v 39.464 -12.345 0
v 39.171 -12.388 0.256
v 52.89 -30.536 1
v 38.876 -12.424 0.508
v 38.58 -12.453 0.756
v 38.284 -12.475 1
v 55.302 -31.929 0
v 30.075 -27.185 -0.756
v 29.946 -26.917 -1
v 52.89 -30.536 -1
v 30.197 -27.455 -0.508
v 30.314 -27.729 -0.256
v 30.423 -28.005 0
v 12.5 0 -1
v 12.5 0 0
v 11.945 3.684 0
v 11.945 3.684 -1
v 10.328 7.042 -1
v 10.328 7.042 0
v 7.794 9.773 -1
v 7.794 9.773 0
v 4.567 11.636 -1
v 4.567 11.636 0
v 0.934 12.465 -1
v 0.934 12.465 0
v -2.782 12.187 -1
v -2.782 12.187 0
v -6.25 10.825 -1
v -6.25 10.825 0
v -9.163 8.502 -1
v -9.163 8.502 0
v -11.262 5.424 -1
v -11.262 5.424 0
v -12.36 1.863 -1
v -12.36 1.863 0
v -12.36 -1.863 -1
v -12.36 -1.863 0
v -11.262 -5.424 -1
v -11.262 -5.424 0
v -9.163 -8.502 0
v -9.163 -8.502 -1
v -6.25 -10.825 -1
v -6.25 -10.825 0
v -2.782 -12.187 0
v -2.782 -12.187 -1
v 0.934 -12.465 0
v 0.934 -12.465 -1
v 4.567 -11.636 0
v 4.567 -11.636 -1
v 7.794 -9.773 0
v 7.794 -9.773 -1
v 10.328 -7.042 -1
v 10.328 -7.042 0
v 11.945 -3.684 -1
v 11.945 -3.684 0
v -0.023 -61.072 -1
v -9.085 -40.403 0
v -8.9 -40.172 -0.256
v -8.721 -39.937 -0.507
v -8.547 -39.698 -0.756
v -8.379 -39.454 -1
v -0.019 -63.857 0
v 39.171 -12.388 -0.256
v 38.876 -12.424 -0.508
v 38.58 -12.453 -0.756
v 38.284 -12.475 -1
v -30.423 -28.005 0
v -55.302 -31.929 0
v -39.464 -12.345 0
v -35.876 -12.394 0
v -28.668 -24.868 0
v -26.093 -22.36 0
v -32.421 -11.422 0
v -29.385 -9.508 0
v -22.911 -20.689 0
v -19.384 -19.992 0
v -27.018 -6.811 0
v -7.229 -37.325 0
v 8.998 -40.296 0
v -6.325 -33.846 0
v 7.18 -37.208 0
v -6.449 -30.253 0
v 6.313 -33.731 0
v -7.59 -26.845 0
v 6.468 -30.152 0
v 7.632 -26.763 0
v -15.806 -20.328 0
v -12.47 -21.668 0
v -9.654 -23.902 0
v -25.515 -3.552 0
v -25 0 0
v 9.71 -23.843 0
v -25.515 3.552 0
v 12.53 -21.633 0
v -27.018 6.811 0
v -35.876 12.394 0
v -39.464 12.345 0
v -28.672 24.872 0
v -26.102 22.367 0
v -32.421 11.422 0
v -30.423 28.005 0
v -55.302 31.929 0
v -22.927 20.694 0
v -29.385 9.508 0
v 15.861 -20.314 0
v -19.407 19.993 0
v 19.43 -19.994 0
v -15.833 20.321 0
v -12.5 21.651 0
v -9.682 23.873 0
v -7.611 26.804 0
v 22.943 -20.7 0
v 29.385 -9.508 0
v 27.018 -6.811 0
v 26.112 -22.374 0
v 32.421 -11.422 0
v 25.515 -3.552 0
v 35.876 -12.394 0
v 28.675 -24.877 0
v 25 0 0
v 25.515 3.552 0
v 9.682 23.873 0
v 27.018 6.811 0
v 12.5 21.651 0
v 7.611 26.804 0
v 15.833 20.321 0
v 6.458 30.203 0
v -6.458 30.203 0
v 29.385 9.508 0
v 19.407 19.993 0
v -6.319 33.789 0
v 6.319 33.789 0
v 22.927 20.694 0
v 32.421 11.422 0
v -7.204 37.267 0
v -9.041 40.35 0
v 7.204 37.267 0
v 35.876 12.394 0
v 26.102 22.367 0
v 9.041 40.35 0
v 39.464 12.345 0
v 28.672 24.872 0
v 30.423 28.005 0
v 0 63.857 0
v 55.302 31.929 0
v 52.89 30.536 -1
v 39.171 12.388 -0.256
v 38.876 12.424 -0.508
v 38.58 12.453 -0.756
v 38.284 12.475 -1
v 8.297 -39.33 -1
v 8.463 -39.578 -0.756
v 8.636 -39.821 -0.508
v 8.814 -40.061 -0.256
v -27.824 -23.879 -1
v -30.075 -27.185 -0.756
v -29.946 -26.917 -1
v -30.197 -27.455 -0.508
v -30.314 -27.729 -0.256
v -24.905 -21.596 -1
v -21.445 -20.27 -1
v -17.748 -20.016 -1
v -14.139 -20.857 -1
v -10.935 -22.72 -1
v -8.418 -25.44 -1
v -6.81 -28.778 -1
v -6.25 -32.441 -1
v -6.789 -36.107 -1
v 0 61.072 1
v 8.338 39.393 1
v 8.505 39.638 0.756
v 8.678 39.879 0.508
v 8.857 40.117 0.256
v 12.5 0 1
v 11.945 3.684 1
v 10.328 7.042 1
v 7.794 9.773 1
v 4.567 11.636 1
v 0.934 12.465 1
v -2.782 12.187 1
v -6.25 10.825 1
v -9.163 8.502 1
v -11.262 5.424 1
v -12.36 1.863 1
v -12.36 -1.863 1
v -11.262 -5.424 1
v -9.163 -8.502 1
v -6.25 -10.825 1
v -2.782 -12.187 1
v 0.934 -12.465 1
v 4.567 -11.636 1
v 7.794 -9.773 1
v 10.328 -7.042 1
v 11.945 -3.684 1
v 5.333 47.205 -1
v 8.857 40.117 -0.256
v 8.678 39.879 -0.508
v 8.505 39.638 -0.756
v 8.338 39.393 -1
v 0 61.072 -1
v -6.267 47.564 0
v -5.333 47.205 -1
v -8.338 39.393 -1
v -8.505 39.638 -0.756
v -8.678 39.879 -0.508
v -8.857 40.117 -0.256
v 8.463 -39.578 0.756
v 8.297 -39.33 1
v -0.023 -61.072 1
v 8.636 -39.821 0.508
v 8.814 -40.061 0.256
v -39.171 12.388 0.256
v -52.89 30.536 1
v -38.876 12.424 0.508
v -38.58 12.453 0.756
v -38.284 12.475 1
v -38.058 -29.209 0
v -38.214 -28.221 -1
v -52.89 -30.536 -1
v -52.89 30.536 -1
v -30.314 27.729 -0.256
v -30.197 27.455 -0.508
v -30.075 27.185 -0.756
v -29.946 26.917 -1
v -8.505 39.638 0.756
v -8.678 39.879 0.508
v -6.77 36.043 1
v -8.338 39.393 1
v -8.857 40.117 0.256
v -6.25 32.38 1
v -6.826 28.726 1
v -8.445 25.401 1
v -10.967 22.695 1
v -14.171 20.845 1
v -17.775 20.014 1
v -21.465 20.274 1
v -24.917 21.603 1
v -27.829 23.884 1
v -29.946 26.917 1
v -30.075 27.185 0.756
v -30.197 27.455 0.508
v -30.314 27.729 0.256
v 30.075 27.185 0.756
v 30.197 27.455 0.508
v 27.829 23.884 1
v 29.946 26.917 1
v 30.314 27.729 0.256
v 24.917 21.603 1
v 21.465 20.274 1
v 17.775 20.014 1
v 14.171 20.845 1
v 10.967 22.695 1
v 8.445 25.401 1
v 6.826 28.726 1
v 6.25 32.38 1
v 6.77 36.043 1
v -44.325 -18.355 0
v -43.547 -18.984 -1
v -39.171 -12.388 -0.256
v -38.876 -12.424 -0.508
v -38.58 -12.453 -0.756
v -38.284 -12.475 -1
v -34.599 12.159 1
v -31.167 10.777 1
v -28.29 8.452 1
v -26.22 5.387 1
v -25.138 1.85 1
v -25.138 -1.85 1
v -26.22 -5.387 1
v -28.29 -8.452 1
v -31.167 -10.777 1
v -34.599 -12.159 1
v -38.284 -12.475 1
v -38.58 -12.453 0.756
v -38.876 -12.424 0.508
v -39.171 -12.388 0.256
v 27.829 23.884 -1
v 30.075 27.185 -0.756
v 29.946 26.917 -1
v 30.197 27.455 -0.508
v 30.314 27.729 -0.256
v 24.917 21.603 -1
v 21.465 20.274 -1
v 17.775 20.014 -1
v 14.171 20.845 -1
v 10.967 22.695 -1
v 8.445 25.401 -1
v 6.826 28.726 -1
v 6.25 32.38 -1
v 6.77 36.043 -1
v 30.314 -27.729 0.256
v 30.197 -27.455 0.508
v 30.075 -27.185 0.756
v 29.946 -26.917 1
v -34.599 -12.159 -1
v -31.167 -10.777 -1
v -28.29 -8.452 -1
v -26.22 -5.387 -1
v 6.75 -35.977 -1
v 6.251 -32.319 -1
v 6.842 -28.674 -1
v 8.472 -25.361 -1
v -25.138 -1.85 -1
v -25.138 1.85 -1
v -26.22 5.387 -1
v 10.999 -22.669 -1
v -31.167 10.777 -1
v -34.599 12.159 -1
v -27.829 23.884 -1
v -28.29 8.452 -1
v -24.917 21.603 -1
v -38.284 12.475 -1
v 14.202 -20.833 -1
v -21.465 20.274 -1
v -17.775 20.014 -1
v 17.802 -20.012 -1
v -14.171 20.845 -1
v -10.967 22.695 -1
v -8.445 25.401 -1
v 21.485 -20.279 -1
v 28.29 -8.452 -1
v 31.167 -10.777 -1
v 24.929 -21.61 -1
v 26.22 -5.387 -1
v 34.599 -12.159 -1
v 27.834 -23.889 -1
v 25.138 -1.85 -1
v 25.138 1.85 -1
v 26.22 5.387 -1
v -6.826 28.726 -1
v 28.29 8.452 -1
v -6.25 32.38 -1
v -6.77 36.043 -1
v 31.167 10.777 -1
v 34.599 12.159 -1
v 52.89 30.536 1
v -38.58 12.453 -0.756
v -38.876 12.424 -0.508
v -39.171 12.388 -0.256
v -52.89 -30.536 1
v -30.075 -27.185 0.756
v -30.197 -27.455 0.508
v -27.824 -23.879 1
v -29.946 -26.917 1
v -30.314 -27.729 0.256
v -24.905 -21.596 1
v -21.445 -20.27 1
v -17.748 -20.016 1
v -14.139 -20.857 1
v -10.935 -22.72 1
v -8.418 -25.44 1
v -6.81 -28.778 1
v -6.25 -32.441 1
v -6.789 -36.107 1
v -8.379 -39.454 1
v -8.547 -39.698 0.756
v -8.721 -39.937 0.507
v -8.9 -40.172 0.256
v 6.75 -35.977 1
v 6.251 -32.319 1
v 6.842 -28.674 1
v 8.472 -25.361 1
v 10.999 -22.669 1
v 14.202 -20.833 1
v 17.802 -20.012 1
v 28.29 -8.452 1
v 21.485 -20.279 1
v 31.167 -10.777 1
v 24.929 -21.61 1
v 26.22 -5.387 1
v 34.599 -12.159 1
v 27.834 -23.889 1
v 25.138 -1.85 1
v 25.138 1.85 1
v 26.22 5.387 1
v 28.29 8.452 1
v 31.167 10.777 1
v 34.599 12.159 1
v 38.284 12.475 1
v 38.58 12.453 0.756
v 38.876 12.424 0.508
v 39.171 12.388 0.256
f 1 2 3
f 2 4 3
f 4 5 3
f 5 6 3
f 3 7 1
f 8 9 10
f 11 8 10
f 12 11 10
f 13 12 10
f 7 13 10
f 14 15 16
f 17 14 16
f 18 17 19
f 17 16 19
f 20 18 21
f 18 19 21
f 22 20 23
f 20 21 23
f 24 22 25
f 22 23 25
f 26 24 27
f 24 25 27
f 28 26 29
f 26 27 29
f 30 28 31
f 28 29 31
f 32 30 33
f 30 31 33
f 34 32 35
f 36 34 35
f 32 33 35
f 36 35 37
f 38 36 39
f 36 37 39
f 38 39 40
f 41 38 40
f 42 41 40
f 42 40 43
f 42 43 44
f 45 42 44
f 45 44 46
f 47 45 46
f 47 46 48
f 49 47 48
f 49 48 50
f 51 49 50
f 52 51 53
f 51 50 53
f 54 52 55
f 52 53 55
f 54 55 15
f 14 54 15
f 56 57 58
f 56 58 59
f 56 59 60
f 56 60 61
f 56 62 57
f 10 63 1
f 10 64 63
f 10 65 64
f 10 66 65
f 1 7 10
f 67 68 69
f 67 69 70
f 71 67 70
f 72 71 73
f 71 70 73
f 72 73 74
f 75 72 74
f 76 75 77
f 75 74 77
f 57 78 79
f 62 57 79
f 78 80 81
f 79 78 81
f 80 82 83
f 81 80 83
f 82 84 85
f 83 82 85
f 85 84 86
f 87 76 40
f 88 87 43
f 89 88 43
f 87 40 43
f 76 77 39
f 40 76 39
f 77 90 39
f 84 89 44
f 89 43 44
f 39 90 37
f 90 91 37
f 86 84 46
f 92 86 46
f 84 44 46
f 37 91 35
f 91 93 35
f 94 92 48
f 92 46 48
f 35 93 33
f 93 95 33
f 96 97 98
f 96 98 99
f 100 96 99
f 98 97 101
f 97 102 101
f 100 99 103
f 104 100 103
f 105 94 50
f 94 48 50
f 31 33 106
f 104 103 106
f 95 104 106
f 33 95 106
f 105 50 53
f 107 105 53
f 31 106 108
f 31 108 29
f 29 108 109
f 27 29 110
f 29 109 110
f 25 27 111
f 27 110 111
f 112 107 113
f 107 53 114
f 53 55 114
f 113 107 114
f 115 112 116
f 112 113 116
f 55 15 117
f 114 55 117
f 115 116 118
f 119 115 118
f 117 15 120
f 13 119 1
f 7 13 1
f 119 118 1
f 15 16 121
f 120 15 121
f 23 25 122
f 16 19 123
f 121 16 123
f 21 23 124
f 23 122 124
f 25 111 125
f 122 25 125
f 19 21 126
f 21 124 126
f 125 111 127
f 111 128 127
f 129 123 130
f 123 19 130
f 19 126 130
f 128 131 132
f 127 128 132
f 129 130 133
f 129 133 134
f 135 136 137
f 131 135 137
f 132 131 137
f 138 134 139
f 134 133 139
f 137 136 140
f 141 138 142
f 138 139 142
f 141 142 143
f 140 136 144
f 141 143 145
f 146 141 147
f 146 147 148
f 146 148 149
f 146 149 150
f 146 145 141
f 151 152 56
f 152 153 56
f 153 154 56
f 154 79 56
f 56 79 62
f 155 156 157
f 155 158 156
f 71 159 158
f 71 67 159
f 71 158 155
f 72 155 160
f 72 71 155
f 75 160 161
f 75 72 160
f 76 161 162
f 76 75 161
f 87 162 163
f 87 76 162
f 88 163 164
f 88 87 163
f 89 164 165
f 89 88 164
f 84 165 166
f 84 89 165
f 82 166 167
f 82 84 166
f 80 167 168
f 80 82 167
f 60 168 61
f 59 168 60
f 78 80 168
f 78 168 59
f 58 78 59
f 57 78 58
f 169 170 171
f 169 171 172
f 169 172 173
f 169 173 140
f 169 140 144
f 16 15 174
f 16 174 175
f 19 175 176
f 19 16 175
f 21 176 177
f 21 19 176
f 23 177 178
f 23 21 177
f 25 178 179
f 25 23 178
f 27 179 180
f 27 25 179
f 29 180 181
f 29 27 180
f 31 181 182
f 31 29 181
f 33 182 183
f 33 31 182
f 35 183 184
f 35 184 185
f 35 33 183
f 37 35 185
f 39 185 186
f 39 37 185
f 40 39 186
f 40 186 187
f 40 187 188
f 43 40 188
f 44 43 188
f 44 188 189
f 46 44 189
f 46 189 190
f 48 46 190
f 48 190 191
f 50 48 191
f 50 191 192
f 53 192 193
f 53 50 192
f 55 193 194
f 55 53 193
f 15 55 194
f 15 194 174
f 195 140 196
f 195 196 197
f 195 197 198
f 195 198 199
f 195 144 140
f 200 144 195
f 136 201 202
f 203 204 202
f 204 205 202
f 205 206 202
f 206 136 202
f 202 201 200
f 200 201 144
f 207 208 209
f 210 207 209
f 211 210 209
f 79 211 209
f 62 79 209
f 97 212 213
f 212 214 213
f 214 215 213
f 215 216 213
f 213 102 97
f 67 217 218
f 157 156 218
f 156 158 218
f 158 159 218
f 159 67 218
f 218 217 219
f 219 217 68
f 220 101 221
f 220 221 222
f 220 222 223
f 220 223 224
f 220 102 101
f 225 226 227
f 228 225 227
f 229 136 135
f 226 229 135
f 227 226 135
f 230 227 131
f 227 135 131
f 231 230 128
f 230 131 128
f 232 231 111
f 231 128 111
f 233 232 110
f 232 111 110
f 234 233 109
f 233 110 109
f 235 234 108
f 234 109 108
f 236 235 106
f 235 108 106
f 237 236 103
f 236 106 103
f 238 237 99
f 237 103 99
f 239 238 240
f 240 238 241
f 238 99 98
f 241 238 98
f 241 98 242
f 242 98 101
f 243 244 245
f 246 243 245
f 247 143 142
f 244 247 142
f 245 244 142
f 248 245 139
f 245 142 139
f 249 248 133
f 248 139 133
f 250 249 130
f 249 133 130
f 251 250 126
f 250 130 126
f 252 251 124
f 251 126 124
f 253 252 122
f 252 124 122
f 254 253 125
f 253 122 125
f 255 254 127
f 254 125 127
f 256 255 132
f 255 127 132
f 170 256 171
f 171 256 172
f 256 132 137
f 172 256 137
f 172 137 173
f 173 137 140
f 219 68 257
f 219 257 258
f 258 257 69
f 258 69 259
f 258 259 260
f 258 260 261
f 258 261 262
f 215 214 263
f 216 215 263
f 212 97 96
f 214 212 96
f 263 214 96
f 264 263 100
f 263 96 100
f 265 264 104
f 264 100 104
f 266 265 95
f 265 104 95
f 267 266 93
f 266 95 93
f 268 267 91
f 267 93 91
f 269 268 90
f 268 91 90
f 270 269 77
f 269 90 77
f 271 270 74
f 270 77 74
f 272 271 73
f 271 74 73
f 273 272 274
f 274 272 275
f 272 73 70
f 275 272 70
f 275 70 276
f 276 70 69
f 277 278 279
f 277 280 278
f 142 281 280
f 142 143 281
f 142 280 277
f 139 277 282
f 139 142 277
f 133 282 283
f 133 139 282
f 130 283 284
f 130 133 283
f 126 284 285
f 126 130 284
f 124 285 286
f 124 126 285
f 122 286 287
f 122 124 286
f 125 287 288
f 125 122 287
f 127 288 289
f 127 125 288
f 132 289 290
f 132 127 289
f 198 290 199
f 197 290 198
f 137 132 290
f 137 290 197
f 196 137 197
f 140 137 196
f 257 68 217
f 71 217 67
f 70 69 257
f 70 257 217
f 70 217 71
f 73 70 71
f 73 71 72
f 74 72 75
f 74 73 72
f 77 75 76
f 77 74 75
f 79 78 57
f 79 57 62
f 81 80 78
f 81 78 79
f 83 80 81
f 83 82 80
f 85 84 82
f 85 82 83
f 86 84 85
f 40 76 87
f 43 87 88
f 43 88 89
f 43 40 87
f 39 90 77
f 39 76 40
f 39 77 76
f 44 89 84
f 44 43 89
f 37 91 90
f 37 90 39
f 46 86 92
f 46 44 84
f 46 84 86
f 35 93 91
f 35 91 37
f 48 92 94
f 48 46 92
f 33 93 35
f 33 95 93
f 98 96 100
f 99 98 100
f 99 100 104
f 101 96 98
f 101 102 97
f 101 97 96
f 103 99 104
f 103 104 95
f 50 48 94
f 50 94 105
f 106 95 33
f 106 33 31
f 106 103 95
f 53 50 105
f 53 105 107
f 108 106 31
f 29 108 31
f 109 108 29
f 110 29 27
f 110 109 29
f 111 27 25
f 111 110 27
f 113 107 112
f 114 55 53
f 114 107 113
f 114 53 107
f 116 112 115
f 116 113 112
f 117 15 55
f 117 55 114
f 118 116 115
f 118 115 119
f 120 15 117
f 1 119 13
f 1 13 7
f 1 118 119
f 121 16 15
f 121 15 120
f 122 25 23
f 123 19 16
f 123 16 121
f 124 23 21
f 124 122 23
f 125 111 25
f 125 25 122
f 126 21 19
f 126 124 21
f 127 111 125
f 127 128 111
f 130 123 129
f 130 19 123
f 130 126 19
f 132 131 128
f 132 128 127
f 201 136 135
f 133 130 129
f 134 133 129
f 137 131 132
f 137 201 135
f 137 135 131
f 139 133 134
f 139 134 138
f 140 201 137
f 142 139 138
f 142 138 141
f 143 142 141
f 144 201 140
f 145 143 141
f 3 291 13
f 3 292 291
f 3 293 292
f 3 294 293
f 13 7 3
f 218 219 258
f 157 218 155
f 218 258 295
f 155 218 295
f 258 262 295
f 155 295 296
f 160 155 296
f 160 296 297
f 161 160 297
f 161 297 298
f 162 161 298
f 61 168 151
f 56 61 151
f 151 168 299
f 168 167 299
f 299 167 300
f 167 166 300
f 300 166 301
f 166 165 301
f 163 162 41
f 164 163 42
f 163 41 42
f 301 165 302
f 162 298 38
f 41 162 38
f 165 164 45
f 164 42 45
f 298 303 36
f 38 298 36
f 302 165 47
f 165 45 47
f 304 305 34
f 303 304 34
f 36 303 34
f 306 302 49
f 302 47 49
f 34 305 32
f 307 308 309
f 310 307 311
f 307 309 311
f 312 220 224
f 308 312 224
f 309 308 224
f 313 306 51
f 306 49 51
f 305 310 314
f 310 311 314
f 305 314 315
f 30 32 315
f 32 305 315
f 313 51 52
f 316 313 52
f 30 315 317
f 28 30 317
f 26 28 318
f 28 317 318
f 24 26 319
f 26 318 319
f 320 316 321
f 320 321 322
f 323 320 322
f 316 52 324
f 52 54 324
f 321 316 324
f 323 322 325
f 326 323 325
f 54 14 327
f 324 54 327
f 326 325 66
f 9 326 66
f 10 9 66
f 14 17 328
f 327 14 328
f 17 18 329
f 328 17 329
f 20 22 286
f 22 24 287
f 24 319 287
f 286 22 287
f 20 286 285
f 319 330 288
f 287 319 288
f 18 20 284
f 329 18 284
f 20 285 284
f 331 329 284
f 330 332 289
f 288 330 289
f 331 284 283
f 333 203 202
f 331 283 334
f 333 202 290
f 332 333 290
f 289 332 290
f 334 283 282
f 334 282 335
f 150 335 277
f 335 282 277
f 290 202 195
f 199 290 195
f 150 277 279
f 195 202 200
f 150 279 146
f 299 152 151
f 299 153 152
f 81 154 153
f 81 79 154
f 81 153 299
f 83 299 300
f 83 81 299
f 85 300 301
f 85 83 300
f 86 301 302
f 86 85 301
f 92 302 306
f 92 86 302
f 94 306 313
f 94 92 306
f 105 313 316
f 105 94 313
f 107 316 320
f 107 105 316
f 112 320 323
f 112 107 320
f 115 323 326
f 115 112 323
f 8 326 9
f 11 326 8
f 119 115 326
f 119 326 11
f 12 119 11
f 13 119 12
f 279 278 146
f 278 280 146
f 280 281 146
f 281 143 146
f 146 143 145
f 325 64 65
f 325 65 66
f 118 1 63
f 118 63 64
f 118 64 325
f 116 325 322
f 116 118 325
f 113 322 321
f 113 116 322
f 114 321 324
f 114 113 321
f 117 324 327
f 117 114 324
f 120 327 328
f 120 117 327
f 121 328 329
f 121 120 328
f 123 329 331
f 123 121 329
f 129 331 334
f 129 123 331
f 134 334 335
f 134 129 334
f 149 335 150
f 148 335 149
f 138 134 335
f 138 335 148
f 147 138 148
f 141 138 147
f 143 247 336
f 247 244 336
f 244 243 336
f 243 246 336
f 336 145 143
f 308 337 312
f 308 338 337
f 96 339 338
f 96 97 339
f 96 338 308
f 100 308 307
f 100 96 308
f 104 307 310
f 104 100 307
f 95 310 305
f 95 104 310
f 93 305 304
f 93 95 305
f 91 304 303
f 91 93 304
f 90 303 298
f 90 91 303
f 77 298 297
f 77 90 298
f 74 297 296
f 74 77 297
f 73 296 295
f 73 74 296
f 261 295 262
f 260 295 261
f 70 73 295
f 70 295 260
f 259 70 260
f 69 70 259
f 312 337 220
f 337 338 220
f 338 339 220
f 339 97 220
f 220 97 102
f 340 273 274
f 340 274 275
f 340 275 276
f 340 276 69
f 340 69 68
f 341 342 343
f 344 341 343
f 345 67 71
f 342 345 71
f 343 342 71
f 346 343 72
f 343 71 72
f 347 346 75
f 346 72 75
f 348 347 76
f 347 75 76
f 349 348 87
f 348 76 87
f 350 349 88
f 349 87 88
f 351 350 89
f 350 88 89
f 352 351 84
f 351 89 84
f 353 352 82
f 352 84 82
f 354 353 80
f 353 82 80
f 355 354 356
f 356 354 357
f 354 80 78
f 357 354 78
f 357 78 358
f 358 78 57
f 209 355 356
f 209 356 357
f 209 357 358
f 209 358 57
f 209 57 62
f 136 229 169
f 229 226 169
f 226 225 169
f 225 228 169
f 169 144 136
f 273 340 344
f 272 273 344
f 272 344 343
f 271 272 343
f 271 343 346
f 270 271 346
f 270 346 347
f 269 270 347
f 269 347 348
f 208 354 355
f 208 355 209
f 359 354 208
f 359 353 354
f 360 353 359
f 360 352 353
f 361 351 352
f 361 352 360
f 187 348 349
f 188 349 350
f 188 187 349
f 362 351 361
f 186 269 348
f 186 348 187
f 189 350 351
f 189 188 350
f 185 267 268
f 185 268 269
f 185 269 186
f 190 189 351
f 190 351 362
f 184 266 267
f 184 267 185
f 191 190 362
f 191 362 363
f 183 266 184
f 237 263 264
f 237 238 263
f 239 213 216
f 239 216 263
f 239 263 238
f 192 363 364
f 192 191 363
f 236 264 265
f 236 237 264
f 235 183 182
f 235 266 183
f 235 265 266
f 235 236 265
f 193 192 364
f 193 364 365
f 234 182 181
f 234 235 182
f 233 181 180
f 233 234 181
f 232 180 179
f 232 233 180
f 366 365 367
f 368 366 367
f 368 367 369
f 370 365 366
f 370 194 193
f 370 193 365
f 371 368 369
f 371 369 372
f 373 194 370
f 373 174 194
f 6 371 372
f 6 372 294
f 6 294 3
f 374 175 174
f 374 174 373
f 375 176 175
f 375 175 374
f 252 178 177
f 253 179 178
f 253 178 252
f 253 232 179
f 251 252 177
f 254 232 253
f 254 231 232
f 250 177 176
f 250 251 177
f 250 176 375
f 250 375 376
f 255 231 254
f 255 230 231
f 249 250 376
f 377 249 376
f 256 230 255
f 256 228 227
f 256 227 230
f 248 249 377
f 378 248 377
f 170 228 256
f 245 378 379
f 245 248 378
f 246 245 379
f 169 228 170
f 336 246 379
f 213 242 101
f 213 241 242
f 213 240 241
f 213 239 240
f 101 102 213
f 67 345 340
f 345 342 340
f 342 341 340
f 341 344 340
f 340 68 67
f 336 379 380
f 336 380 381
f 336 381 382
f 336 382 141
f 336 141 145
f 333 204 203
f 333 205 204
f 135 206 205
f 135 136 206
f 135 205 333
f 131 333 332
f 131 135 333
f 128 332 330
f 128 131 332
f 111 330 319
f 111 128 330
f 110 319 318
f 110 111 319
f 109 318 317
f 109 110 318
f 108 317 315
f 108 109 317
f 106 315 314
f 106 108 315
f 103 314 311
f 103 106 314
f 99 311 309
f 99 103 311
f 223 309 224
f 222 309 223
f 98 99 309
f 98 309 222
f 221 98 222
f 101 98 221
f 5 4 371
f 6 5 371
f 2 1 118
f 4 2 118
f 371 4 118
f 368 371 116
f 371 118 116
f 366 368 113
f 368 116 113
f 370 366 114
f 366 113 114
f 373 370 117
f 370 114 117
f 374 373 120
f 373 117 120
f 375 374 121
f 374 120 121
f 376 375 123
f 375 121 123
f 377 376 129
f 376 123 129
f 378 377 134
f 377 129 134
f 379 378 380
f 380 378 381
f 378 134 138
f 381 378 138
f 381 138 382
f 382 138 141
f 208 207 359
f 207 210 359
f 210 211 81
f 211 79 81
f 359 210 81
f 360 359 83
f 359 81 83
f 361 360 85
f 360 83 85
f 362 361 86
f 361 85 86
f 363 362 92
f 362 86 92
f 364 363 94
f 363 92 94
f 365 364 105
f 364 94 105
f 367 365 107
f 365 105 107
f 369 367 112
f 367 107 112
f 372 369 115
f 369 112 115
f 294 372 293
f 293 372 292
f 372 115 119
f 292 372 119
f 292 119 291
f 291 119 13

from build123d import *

# Parameters (mm, degrees)
F0_R         = 12.5
F1_DEPTH     = 1
F2_T1_DEPTH  = 53.573606434
F2_T3_DEPTH  = 53.573606434
F2_T5_DEPTH  = 53.5736064345
F2_T7_DEPTH  = 53.5736064338
F2_T9_DEPTH  = 53.573606434
F2_T11_DEPTH = 59.849360607
F2_T13_DEPTH = 53.5916397473
F2_T15_DEPTH = 53.5736064341
F2_T17_DEPTH = 53.573606434
F2_T19_DEPTH = 53.573606434
F2_T21_DEPTH = 59.8387499617
F3_DEPTH     = 1
F4_T1_DEPTH  = 40.7151914942
F4_T3_DEPTH  = 19.123558468
F4_T5_DEPTH  = 40.7151914942
F4_T7_DEPTH  = 19.1235584677
F4_T9_DEPTH  = 59.8387499623
F4_T11_DEPTH = 59.8387499618
F4_T13_DEPTH = 59.8387499617
F4_T15_DEPTH = 59.8387499618
F4_T17_DEPTH = 40.7151914942
F4_T19_DEPTH = 19.1235584677
F4_T21_DEPTH = 40.7151914943
F4_T23_DEPTH = 19.1235584676
F4_T25_DEPTH = 59.828531224
F4_T27_DEPTH = 59.849360607
F5_T1_DEPTH  = 59.8387499611
F5_T3_DEPTH  = 59.838749962
F6_T1_DEPTH  = 52.3772114997


# Not quite as in the source:
# - a fillet or chamfer that OpenCascade refuses, or shapes differently, is made with other operations: its cross-section is extruded or revolved along the edge and cut away or added
# - a feature names something its author has since deleted; it is built from what else it names


with BuildPart() as f1:
    # F0 (on Top) → F1 (new body)
    with BuildSketch(Plane.XY):
        with BuildLine():
            ThreePointArc((12.1993091148, -43.1220058508), (12.5252728209, -21.6360831063), (31.2465952446, -32.1842211044))
            Line((31.2465952446, -32.1842211044), (37.4352447857, -33.1602540379))
            Line((37.4352447857, -33.1602540379), (64.9519052827, -37.5000000012))
            Line((64.9519052827, -37.5000000012), (47.4352447858, -15.8397459622))
            Line((47.4352447858, -15.8397459622), (47.4101819713, -15.8831560303))
            ThreePointArc((47.4101819713, -15.8831560303), (47.4189900332, -15.8568402989), (47.4277834882, -15.830519683))
            Line((47.4277834882, -15.830519683), (43.4956507006, -10.968234711))
            ThreePointArc((43.4956507006, -10.968234711), (25, -3e-10), (43.4956507, 10.9682347114))
            Line((43.4956507, 10.9682347114), (47.4277834882, 15.8305196828))
            ThreePointArc((47.4277834882, 15.8305196828), (47.4189900332, 15.8568402987), (47.4101819713, 15.8831560301))
            Line((47.4101819713, 15.8831560301), (47.4352447858, 15.8397459621))
            Line((47.4352447858, 15.8397459621), (64.9519052853, 37.4999999987))
            Line((64.9519052853, 37.4999999987), (37.4352447862, 33.1602540379))
            Line((37.4352447862, 33.1602540379), (37.4603076002, 33.1168439697))
            ThreePointArc((37.4603076002, 33.1168439697), (37.4419215393, 33.1376298408), (37.4235239447, 33.1584055041))
            Line((37.4235239447, 33.1584055041), (31.2465952455, 32.1842211051))
            ThreePointArc((31.2465952455, 32.1842211051), (12.500000001, 21.6506350947), (12.2490554557, 43.152455816))
            Line((12.2490554557, 43.152455816), (10.0042595438, 48.988925187))
            ThreePointArc((10.0042595437, 48.988925187), (9.9770684942, 48.9944701396), (9.9498743714, 49))
            Line((9.9498743714, 49), (10.0000000003, 49))
            Line((10.0000000003, 49), (3e-10, 75))
            Line((3e-10, 75), (-9.9999999997, 49))
            Line((-9.9999999997, 49), (-9.9498743707, 49))
            ThreePointArc((-9.9498743707, 49), (-9.9770684936, 48.9944701396), (-10.0042595431, 48.988925187))
            Line((-10.0042595431, 48.988925187), (-12.2490554551, 43.1524558158))
            ThreePointArc((-12.2490554551, 43.1524558158), (-12.4999999997, 21.6506350948), (-31.2465952441, 32.1842211045))
            Line((-31.2465952441, 32.1842211045), (-37.4352447851, 33.1602540377))
            Line((-37.4352447851, 33.1602540377), (-64.951905283, 37.5000000002))
            Line((-64.951905283, 37.5000000002), (-47.4352447851, 15.839745962))
            Line((-47.4352447851, 15.839745962), (-47.4101819706, 15.8831560301))
            ThreePointArc((-47.4101819706, 15.8831560301), (-47.4189900325, 15.8568402987), (-47.4277834875, 15.8305196828))
            Line((-47.4277834875, 15.8305196828), (-43.4956506999, 10.9682347111))
            ThreePointArc((-43.4956506999, 10.9682347111), (-24.9999999998, 0), (-43.4956506997, -10.9682347113))
            Line((-43.4956506997, -10.9682347113), (-47.4277834875, -15.830519683))
            ThreePointArc((-47.4277834875, -15.830519683), (-47.4189900326, -15.8568402989), (-47.4101819706, -15.8831560303))
            Line((-47.4101819706, -15.8831560303), (-47.4352447851, -15.8397459622))
            Line((-47.4352447851, -15.8397459622), (-64.9519052836, -37.5))
            Line((-64.9519052836, -37.5), (-37.4352447851, -33.1602540379))
            Line((-37.4352447851, -33.1602540379), (-37.4603075996, -33.1168439699))
            ThreePointArc((-37.4603075996, -33.1168439699), (-37.4419215386, -33.1376298409), (-37.4235239441, -33.1584055043))
            Line((-37.4235239441, -33.1584055043), (-31.2465952444, -32.1842211048))
            ThreePointArc((-31.2465952444, -32.1842211048), (-12.4748304406, -21.6652058125), (-12.2988061822, -43.1825906916))
            Line((-12.2988061822, -43.1825906916), (-10.058717508, -48.977772531))
            ThreePointArc((-10.058717508, -48.977772531), (-10.0043021126, -48.9889164938), (-9.9498743711, -49))
            Line((-9.9498743711, -49), (-10.0501256289, -49))
            Line((-10.0501256289, -49), (0, -75))
            Line((0, -75), (9.9498743711, -49))
            Line((9.9498743711, -49), (12.1993091148, -43.1220058508))
        make_face()
        Circle(F0_R, mode=Mode.SUBTRACT)
    extrude(amount=F1_DEPTH)

    # F2: chamfer of 5 on 11 edges, made by hand

    # F2_s2 → F2_t1 (cut)
    with BuildSketch(Plane(origin=(-10.5129640229, 27.3337064595, 0), x_dir=(0, 0, 1), z_dir=(-0.3589790793, 0.9333456062, 0))):
        Polygon((1, 21.9234309485), (-4, 26.9234309485), (1, 26.9234309485), align=None)
    extrude(amount=F2_T1_DEPTH, mode=Mode.SUBTRACT)

    # F2_s4 → F2_t3 (cut)
    with BuildSketch(Plane(origin=(29.7447679359, 77.3363966333, 0), x_dir=(0, 0, 1), z_dir=(-0.3589790793, -0.9333456062, 0))):
        Polygon((1, 21.9234309479), (-4, 26.9234309479), (1, 26.9234309479), align=None)
    extrude(amount=F2_T3_DEPTH, mode=Mode.SUBTRACT)

    # F2_s6 → F2_t5 (cut)
    with BuildSketch(Plane(origin=(81.84766809, 12.9084736504, 0), x_dir=(0, 0, 1), z_dir=(-0.9877905451, -0.1557878009, 0))):
        Polygon((1, 21.9234309501), (-4, 26.9234309501), (1, 26.9234309501), align=None)
    extrude(amount=F2_T5_DEPTH, mode=Mode.SUBTRACT)

    # F2_s8 → F2_t7 (cut)
    with BuildSketch(Plane(origin=(18.4152021646, 22.771347143, 0), x_dir=(0, 0, 1), z_dir=(0.6288114659, 0.7775578052, 0))):
        Polygon((1, 21.9234309459), (-4, 26.9234309459), (1, 26.9234309459), align=None)
    extrude(amount=F2_T7_DEPTH, mode=Mode.SUBTRACT)

    # F2_s10 → F2_t9 (cut)
    with BuildSketch(Plane(origin=(52.1029001483, -64.427922981, 0), x_dir=(0, 0, 1), z_dir=(-0.6288114658, 0.7775578053, 0))):
        Polygon((1, 21.9234309512), (-4, 26.9234309512), (1, 26.9234309512), align=None)
    extrude(amount=F2_T9_DEPTH, mode=Mode.SUBTRACT)

    # F2_s12 → F2_t11 (cut)
    with BuildSketch(Plane(origin=(-8.2401320813, -21.5322752955, 0), x_dir=(0, 0, 1), z_dir=(-0.3574100383, -0.9339475705, 0))):
        Polygon((1, -21.8057528732), (-4, -26.8057528732), (1, -26.8057528732), align=None)
    extrude(amount=F2_T11_DEPTH, mode=Mode.SUBTRACT)

    # F2_s14 → F2_t13 (cut)
    with BuildSketch(Plane(origin=(10.5359959788, -27.256962307, 0), x_dir=(0, 0, 1), z_dir=(0.3605450827, -0.9327417881, 0))):
        Polygon((1, 22.0408812024), (-4, 27.0408812024), (1, 27.0408812024), align=None)
    extrude(amount=F2_T13_DEPTH, mode=Mode.SUBTRACT)

    # F2_s16 → F2_t15 (cut)
    with BuildSketch(Plane(origin=(-81.8476680892, -12.9084736542, 0), x_dir=(0, 0, 1), z_dir=(0.9877905451, 0.155787801, 0))):
        Polygon((1, 21.9234309484), (-4, 26.9234309484), (1, 26.9234309484), align=None)
    extrude(amount=F2_T15_DEPTH, mode=Mode.SUBTRACT)

    # F2_s18 → F2_t17 (cut)
    with BuildSketch(Plane(origin=(-18.4152021622, -22.7713471426, 0), x_dir=(0, 0, 1), z_dir=(-0.6288114658, -0.7775578052, 0))):
        Polygon((1, 21.9234309477), (-4, 26.9234309477), (1, 26.9234309477), align=None)
    extrude(amount=F2_T17_DEPTH, mode=Mode.SUBTRACT)

    # F2_s20 → F2_t19 (cut)
    with BuildSketch(Plane(origin=(-52.1029001516, 64.4279229792, 0), x_dir=(0, 0, 1), z_dir=(0.6288114658, -0.7775578052, 0))):
        Polygon((1, 21.9234309489), (-4, 26.9234309489), (1, 26.9234309489), align=None)
    extrude(amount=F2_T19_DEPTH, mode=Mode.SUBTRACT)

    # F2_s22 → F2_t21 (cut)
    with BuildSketch(Plane(origin=(-81.8476680889, 12.9084736558, 0), x_dir=(0, 0, 1), z_dir=(0.9877905451, -0.155787801, 0))):
        Polygon((1, -21.9234309474), (-4, -26.9234309474), (1, -26.9234309474), align=None)
    extrude(amount=F2_T21_DEPTH, mode=Mode.SUBTRACT)

    # F6: chamfer of 5 on 1 edges, made by hand

    # F6_s2 → F6_t1 (cut)
    with BuildSketch(Plane(origin=(74.477230945, -11.7460569893, 0), x_dir=(0, 0, 1), z_dir=(-0.9877905451, 0.155787801, 0))):
        Polygon((1, -21.9234309461), (-4, -26.9234309461), (1, -26.9234309461), align=None)
    extrude(amount=F6_T1_DEPTH, mode=Mode.SUBTRACT)


with BuildPart() as f3:
    # F0 (on Top) → F3 (new body)
    with BuildSketch(Plane.XY):
        with BuildLine():
            ThreePointArc((12.1993091148, -43.1220058508), (12.5252728209, -21.6360831063), (31.2465952446, -32.1842211044))
            Line((31.2465952446, -32.1842211044), (37.4352447857, -33.1602540379))
            Line((37.4352447857, -33.1602540379), (64.9519052827, -37.5000000012))
            Line((64.9519052827, -37.5000000012), (47.4352447858, -15.8397459622))
            Line((47.4352447858, -15.8397459622), (47.4101819713, -15.8831560303))
            ThreePointArc((47.4101819713, -15.8831560303), (47.4189900332, -15.8568402989), (47.4277834882, -15.830519683))
            Line((47.4277834882, -15.830519683), (43.4956507006, -10.968234711))
            ThreePointArc((43.4956507006, -10.968234711), (25, -3e-10), (43.4956507, 10.9682347114))
            Line((43.4956507, 10.9682347114), (47.4277834882, 15.8305196828))
            ThreePointArc((47.4277834882, 15.8305196828), (47.4189900332, 15.8568402987), (47.4101819713, 15.8831560301))
            Line((47.4101819713, 15.8831560301), (47.4352447858, 15.8397459621))
            Line((47.4352447858, 15.8397459621), (64.9519052853, 37.4999999987))
            Line((64.9519052853, 37.4999999987), (37.4352447862, 33.1602540379))
            Line((37.4352447862, 33.1602540379), (37.4603076002, 33.1168439697))
            ThreePointArc((37.4603076002, 33.1168439697), (37.4419215393, 33.1376298408), (37.4235239447, 33.1584055041))
            Line((37.4235239447, 33.1584055041), (31.2465952455, 32.1842211051))
            ThreePointArc((31.2465952455, 32.1842211051), (12.500000001, 21.6506350947), (12.2490554557, 43.152455816))
            Line((12.2490554557, 43.152455816), (10.0042595438, 48.988925187))
            ThreePointArc((10.0042595437, 48.988925187), (9.9770684942, 48.9944701396), (9.9498743714, 49))
            Line((9.9498743714, 49), (10.0000000003, 49))
            Line((10.0000000003, 49), (3e-10, 75))
            Line((3e-10, 75), (-9.9999999997, 49))
            Line((-9.9999999997, 49), (-9.9498743707, 49))
            ThreePointArc((-9.9498743707, 49), (-9.9770684936, 48.9944701396), (-10.0042595431, 48.988925187))
            Line((-10.0042595431, 48.988925187), (-12.2490554551, 43.1524558158))
            ThreePointArc((-12.2490554551, 43.1524558158), (-12.4999999997, 21.6506350948), (-31.2465952441, 32.1842211045))
            Line((-31.2465952441, 32.1842211045), (-37.4352447851, 33.1602540377))
            Line((-37.4352447851, 33.1602540377), (-64.951905283, 37.5000000002))
            Line((-64.951905283, 37.5000000002), (-47.4352447851, 15.839745962))
            Line((-47.4352447851, 15.839745962), (-47.4101819706, 15.8831560301))
            ThreePointArc((-47.4101819706, 15.8831560301), (-47.4189900325, 15.8568402987), (-47.4277834875, 15.8305196828))
            Line((-47.4277834875, 15.8305196828), (-43.4956506999, 10.9682347111))
            ThreePointArc((-43.4956506999, 10.9682347111), (-24.9999999998, 0), (-43.4956506997, -10.9682347113))
            Line((-43.4956506997, -10.9682347113), (-47.4277834875, -15.830519683))
            ThreePointArc((-47.4277834875, -15.830519683), (-47.4189900326, -15.8568402989), (-47.4101819706, -15.8831560303))
            Line((-47.4101819706, -15.8831560303), (-47.4352447851, -15.8397459622))
            Line((-47.4352447851, -15.8397459622), (-64.9519052836, -37.5))
            Line((-64.9519052836, -37.5), (-37.4352447851, -33.1602540379))
            Line((-37.4352447851, -33.1602540379), (-37.4603075996, -33.1168439699))
            ThreePointArc((-37.4603075996, -33.1168439699), (-37.4419215386, -33.1376298409), (-37.4235239441, -33.1584055043))
            Line((-37.4235239441, -33.1584055043), (-31.2465952444, -32.1842211048))
            ThreePointArc((-31.2465952444, -32.1842211048), (-12.4748304406, -21.6652058125), (-12.2988061822, -43.1825906916))
            Line((-12.2988061822, -43.1825906916), (-10.058717508, -48.977772531))
            ThreePointArc((-10.058717508, -48.977772531), (-10.0043021126, -48.9889164938), (-9.9498743711, -49))
            Line((-9.9498743711, -49), (-10.0501256289, -49))
            Line((-10.0501256289, -49), (0, -75))
            Line((0, -75), (9.9498743711, -49))
            Line((9.9498743711, -49), (12.1993091148, -43.1220058508))
        make_face()
        Circle(F0_R, mode=Mode.SUBTRACT)
        with BuildLine():
            Line((47.4101819713, -15.8831560303), (47.4352447858, -15.8397459622))
            Line((47.4352447858, -15.8397459622), (47.4277834882, -15.830519683))
            ThreePointArc((47.4277834882, -15.830519683), (47.4189900332, -15.8568402989), (47.4101819713, -15.8831560303))
        make_face()
        with BuildLine():
            Line((-10.058717508, -48.977772531), (-10.0501256289, -49))
            Line((-10.0501256289, -49), (-9.9498743711, -49))
            ThreePointArc((-9.9498743711, -49), (-10.0043021126, -48.9889164938), (-10.058717508, -48.977772531))
        make_face()
        with BuildLine():
            ThreePointArc((47.4101819713, 15.8831560301), (47.4189900332, 15.8568402987), (47.4277834882, 15.8305196828))
            Line((47.4277834882, 15.8305196828), (47.4352447858, 15.8397459621))
            Line((47.4352447858, 15.8397459621), (47.4101819713, 15.8831560301))
        make_face()
        with BuildLine():
            Line((-37.4352447851, -33.1602540379), (-37.4235239441, -33.1584055043))
            ThreePointArc((-37.4235239441, -33.1584055043), (-37.4419215386, -33.1376298409), (-37.4603075996, -33.1168439699))
            Line((-37.4603075996, -33.1168439699), (-37.4352447851, -33.1602540379))
        make_face()
        with BuildLine():
            Line((37.4603076002, 33.1168439697), (37.4352447862, 33.1602540379))
            Line((37.4352447862, 33.1602540379), (37.4235239447, 33.1584055041))
            ThreePointArc((37.4235239447, 33.1584055041), (37.4419215393, 33.1376298408), (37.4603076002, 33.1168439697))
        make_face()
        with BuildLine():
            Line((-47.4277834875, -15.830519683), (-47.4352447851, -15.8397459622))
            Line((-47.4352447851, -15.8397459622), (-47.4101819706, -15.8831560303))
            ThreePointArc((-47.4101819706, -15.8831560303), (-47.4189900326, -15.8568402989), (-47.4277834875, -15.830519683))
        make_face()
        with BuildLine():
            ThreePointArc((9.9498743714, 49), (9.9770684942, 48.9944701396), (10.0042595437, 48.988925187))
            Line((10.0042595438, 48.988925187), (10.0000000003, 49))
            Line((10.0000000003, 49), (9.9498743714, 49))
        make_face()
        with BuildLine():
            Line((-47.4352447851, 15.839745962), (-47.4277834875, 15.8305196828))
            ThreePointArc((-47.4277834875, 15.8305196828), (-47.4189900325, 15.8568402987), (-47.4101819706, 15.8831560301))
            Line((-47.4101819706, 15.8831560301), (-47.4352447851, 15.839745962))
        make_face()
        with BuildLine():
            Line((-9.9498743707, 49), (-9.9999999997, 49))
            Line((-9.9999999997, 49), (-10.0042595431, 48.988925187))
            ThreePointArc((-10.0042595431, 48.988925187), (-9.9770684936, 48.9944701396), (-9.9498743707, 49))
        make_face()
    extrude(amount=-F3_DEPTH)

    # F4: chamfer of 5 on 14 edges, made by hand

    # F4_s2 → F4_t1 (cut)
    with BuildSketch(Plane(origin=(29.7447679359, 77.3363966333, 0), x_dir=(0, 0, 1), z_dir=(-0.3589790793, -0.9333456062, 0))):
        Polygon((4, 26.9234309479), (-1, 21.9234309479), (-1, 26.9234309479), align=None)
    extrude(amount=F4_T1_DEPTH, mode=Mode.SUBTRACT)

    # F4_s4 → F4_t3 (cut)
    with BuildSketch(Plane(origin=(15.1288659793, 39.3350515467, 0), x_dir=(0, 0, 1), z_dir=(-0.3589790793, -0.9333456062, 0))):
        Polygon((4, 26.9234309477), (-1, 21.9234309477), (-1, 26.9234309477), align=None)
    extrude(amount=F4_T3_DEPTH, mode=Mode.SUBTRACT)

    # F4_s6 → F4_t5 (cut)
    with BuildSketch(Plane(origin=(-15.1288659793, 39.3350515463, 0), x_dir=(0, 0, 1), z_dir=(-0.3589790793, 0.9333456062, 0))):
        Polygon((4, 26.9234309485), (-1, 21.9234309485), (-1, 26.9234309485), align=None)
    extrude(amount=F4_T5_DEPTH, mode=Mode.SUBTRACT)

    # F4_s8 → F4_t7 (cut)
    with BuildSketch(Plane(origin=(-8.2639085674, 21.4861622756, 0), x_dir=(0, 0, 1), z_dir=(-0.3589790793, 0.9333456062, 0))):
        Polygon((4, 26.9234309483), (-1, 21.9234309483), (-1, 26.9234309483), align=None)
    extrude(amount=F4_T7_DEPTH, mode=Mode.SUBTRACT)

    # F4_s10 → F4_t9 (cut)
    with BuildSketch(Plane(origin=(81.84766809, 12.9084736504, 0), x_dir=(0, 0, 1), z_dir=(-0.9877905451, -0.1557878009, 0))):
        Polygon((4, 26.9234309501), (-1, 21.9234309501), (-1, 26.9234309501), align=None)
    extrude(amount=F4_T9_DEPTH, mode=Mode.SUBTRACT)

    # F4_s12 → F4_t11 (cut)
    with BuildSketch(Plane(origin=(14.4756080788, 17.8998358922, 0), x_dir=(0, 0, 1), z_dir=(0.6288114659, 0.7775578052, 0))):
        Polygon((4, 26.9234309459), (-1, 21.9234309459), (-1, 26.9234309459), align=None)
    extrude(amount=F4_T11_DEPTH, mode=Mode.SUBTRACT)

    # F4_s14 → F4_t13 (cut)
    with BuildSketch(Plane(origin=(-22.7395166441, 3.5863263841, 0), x_dir=(0, 0, 1), z_dir=(-0.9877905451, 0.155787801, 0))):
        Polygon((4, 26.9234309474), (-1, 21.9234309474), (-1, 26.9234309474), align=None)
    extrude(amount=F4_T13_DEPTH, mode=Mode.SUBTRACT)

    # F4_s16 → F4_t15 (cut)
    with BuildSketch(Plane(origin=(-52.1029001516, 64.4279229792, 0), x_dir=(0, 0, 1), z_dir=(0.6288114658, -0.7775578052, 0))):
        Polygon((4, 26.9234309489), (-1, 21.9234309489), (-1, 26.9234309489), align=None)
    extrude(amount=F4_T15_DEPTH, mode=Mode.SUBTRACT)

    # F4_s18 → F4_t17 (cut)
    with BuildSketch(Plane(origin=(-26.5007209087, -32.7695080417, 0), x_dir=(0, 0, 1), z_dir=(-0.6288114658, -0.7775578052, 0))):
        Polygon((4, 26.9234309477), (-1, 21.9234309477), (-1, 26.9234309477), align=None)
    extrude(amount=F4_T17_DEPTH, mode=Mode.SUBTRACT)

    # F4_s20 → F4_t19 (cut)
    with BuildSketch(Plane(origin=(-14.4756080768, -17.8998358917, 0), x_dir=(0, 0, 1), z_dir=(-0.6288114658, -0.7775578052, 0))):
        Polygon((4, 26.9234309476), (-1, 21.9234309476), (-1, 26.9234309476), align=None)
    extrude(amount=F4_T19_DEPTH, mode=Mode.SUBTRACT)

    # F4_s22 → F4_t21 (cut)
    with BuildSketch(Plane(origin=(-81.8476680892, -12.9084736542, 0), x_dir=(0, 0, 1), z_dir=(0.9877905451, 0.155787801, 0))):
        Polygon((4, 26.9234309484), (-1, 21.9234309484), (-1, 26.9234309484), align=None)
    extrude(amount=F4_T21_DEPTH, mode=Mode.SUBTRACT)

    # F4_s24 → F4_t23 (cut)
    with BuildSketch(Plane(origin=(-41.6295868876, -6.5655435043, 0), x_dir=(0, 0, 1), z_dir=(0.9877905451, 0.155787801, 0))):
        Polygon((4, 26.9234309485), (-1, 21.9234309485), (-1, 26.9234309485), align=None)
    extrude(amount=F4_T23_DEPTH, mode=Mode.SUBTRACT)

    # F4_s26 → F4_t25 (cut)
    with BuildSketch(Plane(origin=(8.2873154255, -21.4395529986, 0), x_dir=(0, 0, 1), z_dir=(0.3605450827, -0.9327417881, 0))):
        Polygon((4, 27.0408812024), (-1, 22.0408812024), (-1, 27.0408812024), align=None)
    extrude(amount=F4_T25_DEPTH, mode=Mode.SUBTRACT)

    # F4_s28 → F4_t27 (cut)
    with BuildSketch(Plane(origin=(-29.6308943486, -77.4284402327, 0), x_dir=(0, 0, 1), z_dir=(0.3574100383, 0.9339475705, 0))):
        Polygon((4, 26.8057528732), (-1, 21.8057528732), (-1, 26.8057528732), align=None)
    extrude(amount=F4_T27_DEPTH, mode=Mode.SUBTRACT)

    # F5: chamfer of 5 on 2 edges, made by hand

    # F5_s2 → F5_t1 (cut)
    with BuildSketch(Plane(origin=(22.7395166453, -3.5863263851, 0), x_dir=(0, 0, 1), z_dir=(0.9877905451, -0.155787801, 0))):
        Polygon((-1, 21.9234309461), (4, 26.9234309461), (-1, 26.9234309461), align=None)
    extrude(amount=F5_T1_DEPTH, mode=Mode.SUBTRACT)

    # F5_s4 → F5_t3 (cut)
    with BuildSketch(Plane(origin=(52.1029001483, -64.427922981, 0), x_dir=(0, 0, 1), z_dir=(-0.6288114658, 0.7775578053, 0))):
        Polygon((-1, 21.9234309512), (4, 26.9234309512), (-1, 26.9234309512), align=None)
    extrude(amount=F5_T3_DEPTH, mode=Mode.SUBTRACT)


solid = Compound([f1.part, f3.part])
